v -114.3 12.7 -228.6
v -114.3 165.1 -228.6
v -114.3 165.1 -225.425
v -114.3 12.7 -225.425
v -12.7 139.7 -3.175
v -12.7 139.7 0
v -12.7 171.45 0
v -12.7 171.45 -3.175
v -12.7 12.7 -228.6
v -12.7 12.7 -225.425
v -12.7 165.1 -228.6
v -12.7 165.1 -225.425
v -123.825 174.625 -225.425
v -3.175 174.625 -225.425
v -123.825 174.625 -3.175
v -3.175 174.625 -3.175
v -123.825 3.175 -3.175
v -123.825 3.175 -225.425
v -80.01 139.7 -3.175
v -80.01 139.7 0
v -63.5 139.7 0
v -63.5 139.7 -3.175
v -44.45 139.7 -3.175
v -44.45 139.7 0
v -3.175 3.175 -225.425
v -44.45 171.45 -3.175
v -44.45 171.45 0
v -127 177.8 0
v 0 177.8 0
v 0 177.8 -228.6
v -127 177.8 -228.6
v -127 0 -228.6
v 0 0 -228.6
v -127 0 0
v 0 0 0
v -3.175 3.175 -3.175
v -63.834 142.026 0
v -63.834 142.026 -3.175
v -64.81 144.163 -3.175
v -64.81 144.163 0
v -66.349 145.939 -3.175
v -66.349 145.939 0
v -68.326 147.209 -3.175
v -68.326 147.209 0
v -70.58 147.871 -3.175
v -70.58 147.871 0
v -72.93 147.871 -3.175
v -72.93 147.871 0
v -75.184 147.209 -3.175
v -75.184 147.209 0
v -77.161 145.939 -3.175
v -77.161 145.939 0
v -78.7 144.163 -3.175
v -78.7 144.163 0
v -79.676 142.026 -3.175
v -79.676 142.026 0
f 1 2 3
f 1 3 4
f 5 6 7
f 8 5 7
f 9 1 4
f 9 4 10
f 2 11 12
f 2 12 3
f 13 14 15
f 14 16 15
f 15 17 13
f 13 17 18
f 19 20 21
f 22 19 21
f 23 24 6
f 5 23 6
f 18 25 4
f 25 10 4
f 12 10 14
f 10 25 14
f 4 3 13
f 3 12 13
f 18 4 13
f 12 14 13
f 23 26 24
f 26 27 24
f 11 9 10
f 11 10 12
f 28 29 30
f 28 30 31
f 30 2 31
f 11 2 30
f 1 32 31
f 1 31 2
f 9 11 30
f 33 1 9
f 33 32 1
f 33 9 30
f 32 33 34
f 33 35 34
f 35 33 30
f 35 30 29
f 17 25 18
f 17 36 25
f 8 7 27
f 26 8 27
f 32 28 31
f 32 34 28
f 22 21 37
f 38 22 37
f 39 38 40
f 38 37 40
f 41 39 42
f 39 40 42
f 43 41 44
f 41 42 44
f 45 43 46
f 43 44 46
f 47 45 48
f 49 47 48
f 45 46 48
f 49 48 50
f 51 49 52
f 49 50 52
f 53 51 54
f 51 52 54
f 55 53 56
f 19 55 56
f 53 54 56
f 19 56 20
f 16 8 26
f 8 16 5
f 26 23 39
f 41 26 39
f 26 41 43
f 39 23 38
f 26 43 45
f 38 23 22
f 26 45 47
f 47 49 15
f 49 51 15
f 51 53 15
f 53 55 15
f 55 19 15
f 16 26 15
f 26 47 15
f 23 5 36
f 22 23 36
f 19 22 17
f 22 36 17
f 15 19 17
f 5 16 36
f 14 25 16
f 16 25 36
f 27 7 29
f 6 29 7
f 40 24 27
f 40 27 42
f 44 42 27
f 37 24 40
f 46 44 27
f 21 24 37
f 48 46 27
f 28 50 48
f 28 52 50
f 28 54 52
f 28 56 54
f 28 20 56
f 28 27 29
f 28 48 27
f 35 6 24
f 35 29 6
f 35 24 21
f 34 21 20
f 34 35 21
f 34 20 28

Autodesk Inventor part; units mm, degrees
ref_plane "YZ Plane" through (0, 0, 0) normal (1, 0, 0) x (0, 1, 0)
ref_plane "XZ Plane" through (0, 0, 0) normal (0, 1, 0) x (-1, 0, 0)
ref_plane "XY Plane" through (0, 0, 0) normal (0, 0, 1) x (1, 0, 0)
sketch "Sketch1" plane through (0, 0, 0) normal (0, 1, 0) x (-1, 0, 0)
  line L0 (0, 0) -> (127, 0)
  line L1 (127, 0) -> (127, -228.6)
  line L2 (127, -228.6) -> (0, -228.6)
  line L3 (0, -228.6) -> (0, 0)
  dimension "d0" = 127
  dimension "d1" = 228.6
extrude "Extrusion1" add sketch "Sketch1" along normal blind 177.8
sketch "Sketch2" plane through (0, 0, -228.6) normal (0, 0, -1) x (-1, 0, 0)
  line L0 (127, 0) -> (0, 0) projected
  line L1 (127, 0) -> (127, 177.8) projected
  line L2 (0, 177.8) -> (127, 177.8) projected
  line L3 (0, 0) -> (0, 177.8) projected
  line L4 (114.3, 165.1) -> (114.3, 12.7)
  line L5 (114.3, 12.7) -> (12.7, 12.7)
  line L6 (12.7, 12.7) -> (12.7, 165.1)
  line L7 (12.7, 165.1) -> (114.3, 165.1)
  dimension "d4" = 12.7
shell "Shell1" thickness 3.175 removed faces 1 at (-84.6667, 59.2667, -228.6)
extrude "Extrusion2" add sketch "Sketch2" against normal blind 3.175
sketch "Sketch3" plane through (-127, 0, 0) normal (0, 0, 1) x (1, 0, 0)
  line L0 (127, 0) -> (127, 177.8) projected
  line L1 (0, 177.8) -> (127, 177.8) projected
  line L2 (114.3, 171.45) -> (82.55, 171.45)
  line L3 (82.55, 171.45) -> (82.55, 139.7)
  line L4 (82.55, 139.7) -> (114.3, 139.7)
  line L5 (114.3, 139.7) -> (114.3, 171.45)
  dimension "d10" = 31.75
  dimension "d11" = 31.75
  dimension "d12" = 6.35
  dimension "d13" = 12.7
extrude "Extrusion3" cut sketch "Sketch3" against normal blind 25.4
sketch "Sketch4" plane through (-127, 0, 0) normal (0, 0, 1) x (1, 0, 0)
  line L0 (46.99, 139.7) -> (63.5, 139.7)
  line L1 (127, 0) -> (127, 177.8) projected
  arc A0 (63.5, 139.7) -> (46.99, 139.7) centre (55.245, 139.7) ccw
  dimension "d16" = 16.51
  dimension "d19" = 63.5
  dimension "d20" = 38.1
extrude "Extrusion4" cut sketch "Sketch4" against normal blind 25.4
properties part number "Electronics_Box"
